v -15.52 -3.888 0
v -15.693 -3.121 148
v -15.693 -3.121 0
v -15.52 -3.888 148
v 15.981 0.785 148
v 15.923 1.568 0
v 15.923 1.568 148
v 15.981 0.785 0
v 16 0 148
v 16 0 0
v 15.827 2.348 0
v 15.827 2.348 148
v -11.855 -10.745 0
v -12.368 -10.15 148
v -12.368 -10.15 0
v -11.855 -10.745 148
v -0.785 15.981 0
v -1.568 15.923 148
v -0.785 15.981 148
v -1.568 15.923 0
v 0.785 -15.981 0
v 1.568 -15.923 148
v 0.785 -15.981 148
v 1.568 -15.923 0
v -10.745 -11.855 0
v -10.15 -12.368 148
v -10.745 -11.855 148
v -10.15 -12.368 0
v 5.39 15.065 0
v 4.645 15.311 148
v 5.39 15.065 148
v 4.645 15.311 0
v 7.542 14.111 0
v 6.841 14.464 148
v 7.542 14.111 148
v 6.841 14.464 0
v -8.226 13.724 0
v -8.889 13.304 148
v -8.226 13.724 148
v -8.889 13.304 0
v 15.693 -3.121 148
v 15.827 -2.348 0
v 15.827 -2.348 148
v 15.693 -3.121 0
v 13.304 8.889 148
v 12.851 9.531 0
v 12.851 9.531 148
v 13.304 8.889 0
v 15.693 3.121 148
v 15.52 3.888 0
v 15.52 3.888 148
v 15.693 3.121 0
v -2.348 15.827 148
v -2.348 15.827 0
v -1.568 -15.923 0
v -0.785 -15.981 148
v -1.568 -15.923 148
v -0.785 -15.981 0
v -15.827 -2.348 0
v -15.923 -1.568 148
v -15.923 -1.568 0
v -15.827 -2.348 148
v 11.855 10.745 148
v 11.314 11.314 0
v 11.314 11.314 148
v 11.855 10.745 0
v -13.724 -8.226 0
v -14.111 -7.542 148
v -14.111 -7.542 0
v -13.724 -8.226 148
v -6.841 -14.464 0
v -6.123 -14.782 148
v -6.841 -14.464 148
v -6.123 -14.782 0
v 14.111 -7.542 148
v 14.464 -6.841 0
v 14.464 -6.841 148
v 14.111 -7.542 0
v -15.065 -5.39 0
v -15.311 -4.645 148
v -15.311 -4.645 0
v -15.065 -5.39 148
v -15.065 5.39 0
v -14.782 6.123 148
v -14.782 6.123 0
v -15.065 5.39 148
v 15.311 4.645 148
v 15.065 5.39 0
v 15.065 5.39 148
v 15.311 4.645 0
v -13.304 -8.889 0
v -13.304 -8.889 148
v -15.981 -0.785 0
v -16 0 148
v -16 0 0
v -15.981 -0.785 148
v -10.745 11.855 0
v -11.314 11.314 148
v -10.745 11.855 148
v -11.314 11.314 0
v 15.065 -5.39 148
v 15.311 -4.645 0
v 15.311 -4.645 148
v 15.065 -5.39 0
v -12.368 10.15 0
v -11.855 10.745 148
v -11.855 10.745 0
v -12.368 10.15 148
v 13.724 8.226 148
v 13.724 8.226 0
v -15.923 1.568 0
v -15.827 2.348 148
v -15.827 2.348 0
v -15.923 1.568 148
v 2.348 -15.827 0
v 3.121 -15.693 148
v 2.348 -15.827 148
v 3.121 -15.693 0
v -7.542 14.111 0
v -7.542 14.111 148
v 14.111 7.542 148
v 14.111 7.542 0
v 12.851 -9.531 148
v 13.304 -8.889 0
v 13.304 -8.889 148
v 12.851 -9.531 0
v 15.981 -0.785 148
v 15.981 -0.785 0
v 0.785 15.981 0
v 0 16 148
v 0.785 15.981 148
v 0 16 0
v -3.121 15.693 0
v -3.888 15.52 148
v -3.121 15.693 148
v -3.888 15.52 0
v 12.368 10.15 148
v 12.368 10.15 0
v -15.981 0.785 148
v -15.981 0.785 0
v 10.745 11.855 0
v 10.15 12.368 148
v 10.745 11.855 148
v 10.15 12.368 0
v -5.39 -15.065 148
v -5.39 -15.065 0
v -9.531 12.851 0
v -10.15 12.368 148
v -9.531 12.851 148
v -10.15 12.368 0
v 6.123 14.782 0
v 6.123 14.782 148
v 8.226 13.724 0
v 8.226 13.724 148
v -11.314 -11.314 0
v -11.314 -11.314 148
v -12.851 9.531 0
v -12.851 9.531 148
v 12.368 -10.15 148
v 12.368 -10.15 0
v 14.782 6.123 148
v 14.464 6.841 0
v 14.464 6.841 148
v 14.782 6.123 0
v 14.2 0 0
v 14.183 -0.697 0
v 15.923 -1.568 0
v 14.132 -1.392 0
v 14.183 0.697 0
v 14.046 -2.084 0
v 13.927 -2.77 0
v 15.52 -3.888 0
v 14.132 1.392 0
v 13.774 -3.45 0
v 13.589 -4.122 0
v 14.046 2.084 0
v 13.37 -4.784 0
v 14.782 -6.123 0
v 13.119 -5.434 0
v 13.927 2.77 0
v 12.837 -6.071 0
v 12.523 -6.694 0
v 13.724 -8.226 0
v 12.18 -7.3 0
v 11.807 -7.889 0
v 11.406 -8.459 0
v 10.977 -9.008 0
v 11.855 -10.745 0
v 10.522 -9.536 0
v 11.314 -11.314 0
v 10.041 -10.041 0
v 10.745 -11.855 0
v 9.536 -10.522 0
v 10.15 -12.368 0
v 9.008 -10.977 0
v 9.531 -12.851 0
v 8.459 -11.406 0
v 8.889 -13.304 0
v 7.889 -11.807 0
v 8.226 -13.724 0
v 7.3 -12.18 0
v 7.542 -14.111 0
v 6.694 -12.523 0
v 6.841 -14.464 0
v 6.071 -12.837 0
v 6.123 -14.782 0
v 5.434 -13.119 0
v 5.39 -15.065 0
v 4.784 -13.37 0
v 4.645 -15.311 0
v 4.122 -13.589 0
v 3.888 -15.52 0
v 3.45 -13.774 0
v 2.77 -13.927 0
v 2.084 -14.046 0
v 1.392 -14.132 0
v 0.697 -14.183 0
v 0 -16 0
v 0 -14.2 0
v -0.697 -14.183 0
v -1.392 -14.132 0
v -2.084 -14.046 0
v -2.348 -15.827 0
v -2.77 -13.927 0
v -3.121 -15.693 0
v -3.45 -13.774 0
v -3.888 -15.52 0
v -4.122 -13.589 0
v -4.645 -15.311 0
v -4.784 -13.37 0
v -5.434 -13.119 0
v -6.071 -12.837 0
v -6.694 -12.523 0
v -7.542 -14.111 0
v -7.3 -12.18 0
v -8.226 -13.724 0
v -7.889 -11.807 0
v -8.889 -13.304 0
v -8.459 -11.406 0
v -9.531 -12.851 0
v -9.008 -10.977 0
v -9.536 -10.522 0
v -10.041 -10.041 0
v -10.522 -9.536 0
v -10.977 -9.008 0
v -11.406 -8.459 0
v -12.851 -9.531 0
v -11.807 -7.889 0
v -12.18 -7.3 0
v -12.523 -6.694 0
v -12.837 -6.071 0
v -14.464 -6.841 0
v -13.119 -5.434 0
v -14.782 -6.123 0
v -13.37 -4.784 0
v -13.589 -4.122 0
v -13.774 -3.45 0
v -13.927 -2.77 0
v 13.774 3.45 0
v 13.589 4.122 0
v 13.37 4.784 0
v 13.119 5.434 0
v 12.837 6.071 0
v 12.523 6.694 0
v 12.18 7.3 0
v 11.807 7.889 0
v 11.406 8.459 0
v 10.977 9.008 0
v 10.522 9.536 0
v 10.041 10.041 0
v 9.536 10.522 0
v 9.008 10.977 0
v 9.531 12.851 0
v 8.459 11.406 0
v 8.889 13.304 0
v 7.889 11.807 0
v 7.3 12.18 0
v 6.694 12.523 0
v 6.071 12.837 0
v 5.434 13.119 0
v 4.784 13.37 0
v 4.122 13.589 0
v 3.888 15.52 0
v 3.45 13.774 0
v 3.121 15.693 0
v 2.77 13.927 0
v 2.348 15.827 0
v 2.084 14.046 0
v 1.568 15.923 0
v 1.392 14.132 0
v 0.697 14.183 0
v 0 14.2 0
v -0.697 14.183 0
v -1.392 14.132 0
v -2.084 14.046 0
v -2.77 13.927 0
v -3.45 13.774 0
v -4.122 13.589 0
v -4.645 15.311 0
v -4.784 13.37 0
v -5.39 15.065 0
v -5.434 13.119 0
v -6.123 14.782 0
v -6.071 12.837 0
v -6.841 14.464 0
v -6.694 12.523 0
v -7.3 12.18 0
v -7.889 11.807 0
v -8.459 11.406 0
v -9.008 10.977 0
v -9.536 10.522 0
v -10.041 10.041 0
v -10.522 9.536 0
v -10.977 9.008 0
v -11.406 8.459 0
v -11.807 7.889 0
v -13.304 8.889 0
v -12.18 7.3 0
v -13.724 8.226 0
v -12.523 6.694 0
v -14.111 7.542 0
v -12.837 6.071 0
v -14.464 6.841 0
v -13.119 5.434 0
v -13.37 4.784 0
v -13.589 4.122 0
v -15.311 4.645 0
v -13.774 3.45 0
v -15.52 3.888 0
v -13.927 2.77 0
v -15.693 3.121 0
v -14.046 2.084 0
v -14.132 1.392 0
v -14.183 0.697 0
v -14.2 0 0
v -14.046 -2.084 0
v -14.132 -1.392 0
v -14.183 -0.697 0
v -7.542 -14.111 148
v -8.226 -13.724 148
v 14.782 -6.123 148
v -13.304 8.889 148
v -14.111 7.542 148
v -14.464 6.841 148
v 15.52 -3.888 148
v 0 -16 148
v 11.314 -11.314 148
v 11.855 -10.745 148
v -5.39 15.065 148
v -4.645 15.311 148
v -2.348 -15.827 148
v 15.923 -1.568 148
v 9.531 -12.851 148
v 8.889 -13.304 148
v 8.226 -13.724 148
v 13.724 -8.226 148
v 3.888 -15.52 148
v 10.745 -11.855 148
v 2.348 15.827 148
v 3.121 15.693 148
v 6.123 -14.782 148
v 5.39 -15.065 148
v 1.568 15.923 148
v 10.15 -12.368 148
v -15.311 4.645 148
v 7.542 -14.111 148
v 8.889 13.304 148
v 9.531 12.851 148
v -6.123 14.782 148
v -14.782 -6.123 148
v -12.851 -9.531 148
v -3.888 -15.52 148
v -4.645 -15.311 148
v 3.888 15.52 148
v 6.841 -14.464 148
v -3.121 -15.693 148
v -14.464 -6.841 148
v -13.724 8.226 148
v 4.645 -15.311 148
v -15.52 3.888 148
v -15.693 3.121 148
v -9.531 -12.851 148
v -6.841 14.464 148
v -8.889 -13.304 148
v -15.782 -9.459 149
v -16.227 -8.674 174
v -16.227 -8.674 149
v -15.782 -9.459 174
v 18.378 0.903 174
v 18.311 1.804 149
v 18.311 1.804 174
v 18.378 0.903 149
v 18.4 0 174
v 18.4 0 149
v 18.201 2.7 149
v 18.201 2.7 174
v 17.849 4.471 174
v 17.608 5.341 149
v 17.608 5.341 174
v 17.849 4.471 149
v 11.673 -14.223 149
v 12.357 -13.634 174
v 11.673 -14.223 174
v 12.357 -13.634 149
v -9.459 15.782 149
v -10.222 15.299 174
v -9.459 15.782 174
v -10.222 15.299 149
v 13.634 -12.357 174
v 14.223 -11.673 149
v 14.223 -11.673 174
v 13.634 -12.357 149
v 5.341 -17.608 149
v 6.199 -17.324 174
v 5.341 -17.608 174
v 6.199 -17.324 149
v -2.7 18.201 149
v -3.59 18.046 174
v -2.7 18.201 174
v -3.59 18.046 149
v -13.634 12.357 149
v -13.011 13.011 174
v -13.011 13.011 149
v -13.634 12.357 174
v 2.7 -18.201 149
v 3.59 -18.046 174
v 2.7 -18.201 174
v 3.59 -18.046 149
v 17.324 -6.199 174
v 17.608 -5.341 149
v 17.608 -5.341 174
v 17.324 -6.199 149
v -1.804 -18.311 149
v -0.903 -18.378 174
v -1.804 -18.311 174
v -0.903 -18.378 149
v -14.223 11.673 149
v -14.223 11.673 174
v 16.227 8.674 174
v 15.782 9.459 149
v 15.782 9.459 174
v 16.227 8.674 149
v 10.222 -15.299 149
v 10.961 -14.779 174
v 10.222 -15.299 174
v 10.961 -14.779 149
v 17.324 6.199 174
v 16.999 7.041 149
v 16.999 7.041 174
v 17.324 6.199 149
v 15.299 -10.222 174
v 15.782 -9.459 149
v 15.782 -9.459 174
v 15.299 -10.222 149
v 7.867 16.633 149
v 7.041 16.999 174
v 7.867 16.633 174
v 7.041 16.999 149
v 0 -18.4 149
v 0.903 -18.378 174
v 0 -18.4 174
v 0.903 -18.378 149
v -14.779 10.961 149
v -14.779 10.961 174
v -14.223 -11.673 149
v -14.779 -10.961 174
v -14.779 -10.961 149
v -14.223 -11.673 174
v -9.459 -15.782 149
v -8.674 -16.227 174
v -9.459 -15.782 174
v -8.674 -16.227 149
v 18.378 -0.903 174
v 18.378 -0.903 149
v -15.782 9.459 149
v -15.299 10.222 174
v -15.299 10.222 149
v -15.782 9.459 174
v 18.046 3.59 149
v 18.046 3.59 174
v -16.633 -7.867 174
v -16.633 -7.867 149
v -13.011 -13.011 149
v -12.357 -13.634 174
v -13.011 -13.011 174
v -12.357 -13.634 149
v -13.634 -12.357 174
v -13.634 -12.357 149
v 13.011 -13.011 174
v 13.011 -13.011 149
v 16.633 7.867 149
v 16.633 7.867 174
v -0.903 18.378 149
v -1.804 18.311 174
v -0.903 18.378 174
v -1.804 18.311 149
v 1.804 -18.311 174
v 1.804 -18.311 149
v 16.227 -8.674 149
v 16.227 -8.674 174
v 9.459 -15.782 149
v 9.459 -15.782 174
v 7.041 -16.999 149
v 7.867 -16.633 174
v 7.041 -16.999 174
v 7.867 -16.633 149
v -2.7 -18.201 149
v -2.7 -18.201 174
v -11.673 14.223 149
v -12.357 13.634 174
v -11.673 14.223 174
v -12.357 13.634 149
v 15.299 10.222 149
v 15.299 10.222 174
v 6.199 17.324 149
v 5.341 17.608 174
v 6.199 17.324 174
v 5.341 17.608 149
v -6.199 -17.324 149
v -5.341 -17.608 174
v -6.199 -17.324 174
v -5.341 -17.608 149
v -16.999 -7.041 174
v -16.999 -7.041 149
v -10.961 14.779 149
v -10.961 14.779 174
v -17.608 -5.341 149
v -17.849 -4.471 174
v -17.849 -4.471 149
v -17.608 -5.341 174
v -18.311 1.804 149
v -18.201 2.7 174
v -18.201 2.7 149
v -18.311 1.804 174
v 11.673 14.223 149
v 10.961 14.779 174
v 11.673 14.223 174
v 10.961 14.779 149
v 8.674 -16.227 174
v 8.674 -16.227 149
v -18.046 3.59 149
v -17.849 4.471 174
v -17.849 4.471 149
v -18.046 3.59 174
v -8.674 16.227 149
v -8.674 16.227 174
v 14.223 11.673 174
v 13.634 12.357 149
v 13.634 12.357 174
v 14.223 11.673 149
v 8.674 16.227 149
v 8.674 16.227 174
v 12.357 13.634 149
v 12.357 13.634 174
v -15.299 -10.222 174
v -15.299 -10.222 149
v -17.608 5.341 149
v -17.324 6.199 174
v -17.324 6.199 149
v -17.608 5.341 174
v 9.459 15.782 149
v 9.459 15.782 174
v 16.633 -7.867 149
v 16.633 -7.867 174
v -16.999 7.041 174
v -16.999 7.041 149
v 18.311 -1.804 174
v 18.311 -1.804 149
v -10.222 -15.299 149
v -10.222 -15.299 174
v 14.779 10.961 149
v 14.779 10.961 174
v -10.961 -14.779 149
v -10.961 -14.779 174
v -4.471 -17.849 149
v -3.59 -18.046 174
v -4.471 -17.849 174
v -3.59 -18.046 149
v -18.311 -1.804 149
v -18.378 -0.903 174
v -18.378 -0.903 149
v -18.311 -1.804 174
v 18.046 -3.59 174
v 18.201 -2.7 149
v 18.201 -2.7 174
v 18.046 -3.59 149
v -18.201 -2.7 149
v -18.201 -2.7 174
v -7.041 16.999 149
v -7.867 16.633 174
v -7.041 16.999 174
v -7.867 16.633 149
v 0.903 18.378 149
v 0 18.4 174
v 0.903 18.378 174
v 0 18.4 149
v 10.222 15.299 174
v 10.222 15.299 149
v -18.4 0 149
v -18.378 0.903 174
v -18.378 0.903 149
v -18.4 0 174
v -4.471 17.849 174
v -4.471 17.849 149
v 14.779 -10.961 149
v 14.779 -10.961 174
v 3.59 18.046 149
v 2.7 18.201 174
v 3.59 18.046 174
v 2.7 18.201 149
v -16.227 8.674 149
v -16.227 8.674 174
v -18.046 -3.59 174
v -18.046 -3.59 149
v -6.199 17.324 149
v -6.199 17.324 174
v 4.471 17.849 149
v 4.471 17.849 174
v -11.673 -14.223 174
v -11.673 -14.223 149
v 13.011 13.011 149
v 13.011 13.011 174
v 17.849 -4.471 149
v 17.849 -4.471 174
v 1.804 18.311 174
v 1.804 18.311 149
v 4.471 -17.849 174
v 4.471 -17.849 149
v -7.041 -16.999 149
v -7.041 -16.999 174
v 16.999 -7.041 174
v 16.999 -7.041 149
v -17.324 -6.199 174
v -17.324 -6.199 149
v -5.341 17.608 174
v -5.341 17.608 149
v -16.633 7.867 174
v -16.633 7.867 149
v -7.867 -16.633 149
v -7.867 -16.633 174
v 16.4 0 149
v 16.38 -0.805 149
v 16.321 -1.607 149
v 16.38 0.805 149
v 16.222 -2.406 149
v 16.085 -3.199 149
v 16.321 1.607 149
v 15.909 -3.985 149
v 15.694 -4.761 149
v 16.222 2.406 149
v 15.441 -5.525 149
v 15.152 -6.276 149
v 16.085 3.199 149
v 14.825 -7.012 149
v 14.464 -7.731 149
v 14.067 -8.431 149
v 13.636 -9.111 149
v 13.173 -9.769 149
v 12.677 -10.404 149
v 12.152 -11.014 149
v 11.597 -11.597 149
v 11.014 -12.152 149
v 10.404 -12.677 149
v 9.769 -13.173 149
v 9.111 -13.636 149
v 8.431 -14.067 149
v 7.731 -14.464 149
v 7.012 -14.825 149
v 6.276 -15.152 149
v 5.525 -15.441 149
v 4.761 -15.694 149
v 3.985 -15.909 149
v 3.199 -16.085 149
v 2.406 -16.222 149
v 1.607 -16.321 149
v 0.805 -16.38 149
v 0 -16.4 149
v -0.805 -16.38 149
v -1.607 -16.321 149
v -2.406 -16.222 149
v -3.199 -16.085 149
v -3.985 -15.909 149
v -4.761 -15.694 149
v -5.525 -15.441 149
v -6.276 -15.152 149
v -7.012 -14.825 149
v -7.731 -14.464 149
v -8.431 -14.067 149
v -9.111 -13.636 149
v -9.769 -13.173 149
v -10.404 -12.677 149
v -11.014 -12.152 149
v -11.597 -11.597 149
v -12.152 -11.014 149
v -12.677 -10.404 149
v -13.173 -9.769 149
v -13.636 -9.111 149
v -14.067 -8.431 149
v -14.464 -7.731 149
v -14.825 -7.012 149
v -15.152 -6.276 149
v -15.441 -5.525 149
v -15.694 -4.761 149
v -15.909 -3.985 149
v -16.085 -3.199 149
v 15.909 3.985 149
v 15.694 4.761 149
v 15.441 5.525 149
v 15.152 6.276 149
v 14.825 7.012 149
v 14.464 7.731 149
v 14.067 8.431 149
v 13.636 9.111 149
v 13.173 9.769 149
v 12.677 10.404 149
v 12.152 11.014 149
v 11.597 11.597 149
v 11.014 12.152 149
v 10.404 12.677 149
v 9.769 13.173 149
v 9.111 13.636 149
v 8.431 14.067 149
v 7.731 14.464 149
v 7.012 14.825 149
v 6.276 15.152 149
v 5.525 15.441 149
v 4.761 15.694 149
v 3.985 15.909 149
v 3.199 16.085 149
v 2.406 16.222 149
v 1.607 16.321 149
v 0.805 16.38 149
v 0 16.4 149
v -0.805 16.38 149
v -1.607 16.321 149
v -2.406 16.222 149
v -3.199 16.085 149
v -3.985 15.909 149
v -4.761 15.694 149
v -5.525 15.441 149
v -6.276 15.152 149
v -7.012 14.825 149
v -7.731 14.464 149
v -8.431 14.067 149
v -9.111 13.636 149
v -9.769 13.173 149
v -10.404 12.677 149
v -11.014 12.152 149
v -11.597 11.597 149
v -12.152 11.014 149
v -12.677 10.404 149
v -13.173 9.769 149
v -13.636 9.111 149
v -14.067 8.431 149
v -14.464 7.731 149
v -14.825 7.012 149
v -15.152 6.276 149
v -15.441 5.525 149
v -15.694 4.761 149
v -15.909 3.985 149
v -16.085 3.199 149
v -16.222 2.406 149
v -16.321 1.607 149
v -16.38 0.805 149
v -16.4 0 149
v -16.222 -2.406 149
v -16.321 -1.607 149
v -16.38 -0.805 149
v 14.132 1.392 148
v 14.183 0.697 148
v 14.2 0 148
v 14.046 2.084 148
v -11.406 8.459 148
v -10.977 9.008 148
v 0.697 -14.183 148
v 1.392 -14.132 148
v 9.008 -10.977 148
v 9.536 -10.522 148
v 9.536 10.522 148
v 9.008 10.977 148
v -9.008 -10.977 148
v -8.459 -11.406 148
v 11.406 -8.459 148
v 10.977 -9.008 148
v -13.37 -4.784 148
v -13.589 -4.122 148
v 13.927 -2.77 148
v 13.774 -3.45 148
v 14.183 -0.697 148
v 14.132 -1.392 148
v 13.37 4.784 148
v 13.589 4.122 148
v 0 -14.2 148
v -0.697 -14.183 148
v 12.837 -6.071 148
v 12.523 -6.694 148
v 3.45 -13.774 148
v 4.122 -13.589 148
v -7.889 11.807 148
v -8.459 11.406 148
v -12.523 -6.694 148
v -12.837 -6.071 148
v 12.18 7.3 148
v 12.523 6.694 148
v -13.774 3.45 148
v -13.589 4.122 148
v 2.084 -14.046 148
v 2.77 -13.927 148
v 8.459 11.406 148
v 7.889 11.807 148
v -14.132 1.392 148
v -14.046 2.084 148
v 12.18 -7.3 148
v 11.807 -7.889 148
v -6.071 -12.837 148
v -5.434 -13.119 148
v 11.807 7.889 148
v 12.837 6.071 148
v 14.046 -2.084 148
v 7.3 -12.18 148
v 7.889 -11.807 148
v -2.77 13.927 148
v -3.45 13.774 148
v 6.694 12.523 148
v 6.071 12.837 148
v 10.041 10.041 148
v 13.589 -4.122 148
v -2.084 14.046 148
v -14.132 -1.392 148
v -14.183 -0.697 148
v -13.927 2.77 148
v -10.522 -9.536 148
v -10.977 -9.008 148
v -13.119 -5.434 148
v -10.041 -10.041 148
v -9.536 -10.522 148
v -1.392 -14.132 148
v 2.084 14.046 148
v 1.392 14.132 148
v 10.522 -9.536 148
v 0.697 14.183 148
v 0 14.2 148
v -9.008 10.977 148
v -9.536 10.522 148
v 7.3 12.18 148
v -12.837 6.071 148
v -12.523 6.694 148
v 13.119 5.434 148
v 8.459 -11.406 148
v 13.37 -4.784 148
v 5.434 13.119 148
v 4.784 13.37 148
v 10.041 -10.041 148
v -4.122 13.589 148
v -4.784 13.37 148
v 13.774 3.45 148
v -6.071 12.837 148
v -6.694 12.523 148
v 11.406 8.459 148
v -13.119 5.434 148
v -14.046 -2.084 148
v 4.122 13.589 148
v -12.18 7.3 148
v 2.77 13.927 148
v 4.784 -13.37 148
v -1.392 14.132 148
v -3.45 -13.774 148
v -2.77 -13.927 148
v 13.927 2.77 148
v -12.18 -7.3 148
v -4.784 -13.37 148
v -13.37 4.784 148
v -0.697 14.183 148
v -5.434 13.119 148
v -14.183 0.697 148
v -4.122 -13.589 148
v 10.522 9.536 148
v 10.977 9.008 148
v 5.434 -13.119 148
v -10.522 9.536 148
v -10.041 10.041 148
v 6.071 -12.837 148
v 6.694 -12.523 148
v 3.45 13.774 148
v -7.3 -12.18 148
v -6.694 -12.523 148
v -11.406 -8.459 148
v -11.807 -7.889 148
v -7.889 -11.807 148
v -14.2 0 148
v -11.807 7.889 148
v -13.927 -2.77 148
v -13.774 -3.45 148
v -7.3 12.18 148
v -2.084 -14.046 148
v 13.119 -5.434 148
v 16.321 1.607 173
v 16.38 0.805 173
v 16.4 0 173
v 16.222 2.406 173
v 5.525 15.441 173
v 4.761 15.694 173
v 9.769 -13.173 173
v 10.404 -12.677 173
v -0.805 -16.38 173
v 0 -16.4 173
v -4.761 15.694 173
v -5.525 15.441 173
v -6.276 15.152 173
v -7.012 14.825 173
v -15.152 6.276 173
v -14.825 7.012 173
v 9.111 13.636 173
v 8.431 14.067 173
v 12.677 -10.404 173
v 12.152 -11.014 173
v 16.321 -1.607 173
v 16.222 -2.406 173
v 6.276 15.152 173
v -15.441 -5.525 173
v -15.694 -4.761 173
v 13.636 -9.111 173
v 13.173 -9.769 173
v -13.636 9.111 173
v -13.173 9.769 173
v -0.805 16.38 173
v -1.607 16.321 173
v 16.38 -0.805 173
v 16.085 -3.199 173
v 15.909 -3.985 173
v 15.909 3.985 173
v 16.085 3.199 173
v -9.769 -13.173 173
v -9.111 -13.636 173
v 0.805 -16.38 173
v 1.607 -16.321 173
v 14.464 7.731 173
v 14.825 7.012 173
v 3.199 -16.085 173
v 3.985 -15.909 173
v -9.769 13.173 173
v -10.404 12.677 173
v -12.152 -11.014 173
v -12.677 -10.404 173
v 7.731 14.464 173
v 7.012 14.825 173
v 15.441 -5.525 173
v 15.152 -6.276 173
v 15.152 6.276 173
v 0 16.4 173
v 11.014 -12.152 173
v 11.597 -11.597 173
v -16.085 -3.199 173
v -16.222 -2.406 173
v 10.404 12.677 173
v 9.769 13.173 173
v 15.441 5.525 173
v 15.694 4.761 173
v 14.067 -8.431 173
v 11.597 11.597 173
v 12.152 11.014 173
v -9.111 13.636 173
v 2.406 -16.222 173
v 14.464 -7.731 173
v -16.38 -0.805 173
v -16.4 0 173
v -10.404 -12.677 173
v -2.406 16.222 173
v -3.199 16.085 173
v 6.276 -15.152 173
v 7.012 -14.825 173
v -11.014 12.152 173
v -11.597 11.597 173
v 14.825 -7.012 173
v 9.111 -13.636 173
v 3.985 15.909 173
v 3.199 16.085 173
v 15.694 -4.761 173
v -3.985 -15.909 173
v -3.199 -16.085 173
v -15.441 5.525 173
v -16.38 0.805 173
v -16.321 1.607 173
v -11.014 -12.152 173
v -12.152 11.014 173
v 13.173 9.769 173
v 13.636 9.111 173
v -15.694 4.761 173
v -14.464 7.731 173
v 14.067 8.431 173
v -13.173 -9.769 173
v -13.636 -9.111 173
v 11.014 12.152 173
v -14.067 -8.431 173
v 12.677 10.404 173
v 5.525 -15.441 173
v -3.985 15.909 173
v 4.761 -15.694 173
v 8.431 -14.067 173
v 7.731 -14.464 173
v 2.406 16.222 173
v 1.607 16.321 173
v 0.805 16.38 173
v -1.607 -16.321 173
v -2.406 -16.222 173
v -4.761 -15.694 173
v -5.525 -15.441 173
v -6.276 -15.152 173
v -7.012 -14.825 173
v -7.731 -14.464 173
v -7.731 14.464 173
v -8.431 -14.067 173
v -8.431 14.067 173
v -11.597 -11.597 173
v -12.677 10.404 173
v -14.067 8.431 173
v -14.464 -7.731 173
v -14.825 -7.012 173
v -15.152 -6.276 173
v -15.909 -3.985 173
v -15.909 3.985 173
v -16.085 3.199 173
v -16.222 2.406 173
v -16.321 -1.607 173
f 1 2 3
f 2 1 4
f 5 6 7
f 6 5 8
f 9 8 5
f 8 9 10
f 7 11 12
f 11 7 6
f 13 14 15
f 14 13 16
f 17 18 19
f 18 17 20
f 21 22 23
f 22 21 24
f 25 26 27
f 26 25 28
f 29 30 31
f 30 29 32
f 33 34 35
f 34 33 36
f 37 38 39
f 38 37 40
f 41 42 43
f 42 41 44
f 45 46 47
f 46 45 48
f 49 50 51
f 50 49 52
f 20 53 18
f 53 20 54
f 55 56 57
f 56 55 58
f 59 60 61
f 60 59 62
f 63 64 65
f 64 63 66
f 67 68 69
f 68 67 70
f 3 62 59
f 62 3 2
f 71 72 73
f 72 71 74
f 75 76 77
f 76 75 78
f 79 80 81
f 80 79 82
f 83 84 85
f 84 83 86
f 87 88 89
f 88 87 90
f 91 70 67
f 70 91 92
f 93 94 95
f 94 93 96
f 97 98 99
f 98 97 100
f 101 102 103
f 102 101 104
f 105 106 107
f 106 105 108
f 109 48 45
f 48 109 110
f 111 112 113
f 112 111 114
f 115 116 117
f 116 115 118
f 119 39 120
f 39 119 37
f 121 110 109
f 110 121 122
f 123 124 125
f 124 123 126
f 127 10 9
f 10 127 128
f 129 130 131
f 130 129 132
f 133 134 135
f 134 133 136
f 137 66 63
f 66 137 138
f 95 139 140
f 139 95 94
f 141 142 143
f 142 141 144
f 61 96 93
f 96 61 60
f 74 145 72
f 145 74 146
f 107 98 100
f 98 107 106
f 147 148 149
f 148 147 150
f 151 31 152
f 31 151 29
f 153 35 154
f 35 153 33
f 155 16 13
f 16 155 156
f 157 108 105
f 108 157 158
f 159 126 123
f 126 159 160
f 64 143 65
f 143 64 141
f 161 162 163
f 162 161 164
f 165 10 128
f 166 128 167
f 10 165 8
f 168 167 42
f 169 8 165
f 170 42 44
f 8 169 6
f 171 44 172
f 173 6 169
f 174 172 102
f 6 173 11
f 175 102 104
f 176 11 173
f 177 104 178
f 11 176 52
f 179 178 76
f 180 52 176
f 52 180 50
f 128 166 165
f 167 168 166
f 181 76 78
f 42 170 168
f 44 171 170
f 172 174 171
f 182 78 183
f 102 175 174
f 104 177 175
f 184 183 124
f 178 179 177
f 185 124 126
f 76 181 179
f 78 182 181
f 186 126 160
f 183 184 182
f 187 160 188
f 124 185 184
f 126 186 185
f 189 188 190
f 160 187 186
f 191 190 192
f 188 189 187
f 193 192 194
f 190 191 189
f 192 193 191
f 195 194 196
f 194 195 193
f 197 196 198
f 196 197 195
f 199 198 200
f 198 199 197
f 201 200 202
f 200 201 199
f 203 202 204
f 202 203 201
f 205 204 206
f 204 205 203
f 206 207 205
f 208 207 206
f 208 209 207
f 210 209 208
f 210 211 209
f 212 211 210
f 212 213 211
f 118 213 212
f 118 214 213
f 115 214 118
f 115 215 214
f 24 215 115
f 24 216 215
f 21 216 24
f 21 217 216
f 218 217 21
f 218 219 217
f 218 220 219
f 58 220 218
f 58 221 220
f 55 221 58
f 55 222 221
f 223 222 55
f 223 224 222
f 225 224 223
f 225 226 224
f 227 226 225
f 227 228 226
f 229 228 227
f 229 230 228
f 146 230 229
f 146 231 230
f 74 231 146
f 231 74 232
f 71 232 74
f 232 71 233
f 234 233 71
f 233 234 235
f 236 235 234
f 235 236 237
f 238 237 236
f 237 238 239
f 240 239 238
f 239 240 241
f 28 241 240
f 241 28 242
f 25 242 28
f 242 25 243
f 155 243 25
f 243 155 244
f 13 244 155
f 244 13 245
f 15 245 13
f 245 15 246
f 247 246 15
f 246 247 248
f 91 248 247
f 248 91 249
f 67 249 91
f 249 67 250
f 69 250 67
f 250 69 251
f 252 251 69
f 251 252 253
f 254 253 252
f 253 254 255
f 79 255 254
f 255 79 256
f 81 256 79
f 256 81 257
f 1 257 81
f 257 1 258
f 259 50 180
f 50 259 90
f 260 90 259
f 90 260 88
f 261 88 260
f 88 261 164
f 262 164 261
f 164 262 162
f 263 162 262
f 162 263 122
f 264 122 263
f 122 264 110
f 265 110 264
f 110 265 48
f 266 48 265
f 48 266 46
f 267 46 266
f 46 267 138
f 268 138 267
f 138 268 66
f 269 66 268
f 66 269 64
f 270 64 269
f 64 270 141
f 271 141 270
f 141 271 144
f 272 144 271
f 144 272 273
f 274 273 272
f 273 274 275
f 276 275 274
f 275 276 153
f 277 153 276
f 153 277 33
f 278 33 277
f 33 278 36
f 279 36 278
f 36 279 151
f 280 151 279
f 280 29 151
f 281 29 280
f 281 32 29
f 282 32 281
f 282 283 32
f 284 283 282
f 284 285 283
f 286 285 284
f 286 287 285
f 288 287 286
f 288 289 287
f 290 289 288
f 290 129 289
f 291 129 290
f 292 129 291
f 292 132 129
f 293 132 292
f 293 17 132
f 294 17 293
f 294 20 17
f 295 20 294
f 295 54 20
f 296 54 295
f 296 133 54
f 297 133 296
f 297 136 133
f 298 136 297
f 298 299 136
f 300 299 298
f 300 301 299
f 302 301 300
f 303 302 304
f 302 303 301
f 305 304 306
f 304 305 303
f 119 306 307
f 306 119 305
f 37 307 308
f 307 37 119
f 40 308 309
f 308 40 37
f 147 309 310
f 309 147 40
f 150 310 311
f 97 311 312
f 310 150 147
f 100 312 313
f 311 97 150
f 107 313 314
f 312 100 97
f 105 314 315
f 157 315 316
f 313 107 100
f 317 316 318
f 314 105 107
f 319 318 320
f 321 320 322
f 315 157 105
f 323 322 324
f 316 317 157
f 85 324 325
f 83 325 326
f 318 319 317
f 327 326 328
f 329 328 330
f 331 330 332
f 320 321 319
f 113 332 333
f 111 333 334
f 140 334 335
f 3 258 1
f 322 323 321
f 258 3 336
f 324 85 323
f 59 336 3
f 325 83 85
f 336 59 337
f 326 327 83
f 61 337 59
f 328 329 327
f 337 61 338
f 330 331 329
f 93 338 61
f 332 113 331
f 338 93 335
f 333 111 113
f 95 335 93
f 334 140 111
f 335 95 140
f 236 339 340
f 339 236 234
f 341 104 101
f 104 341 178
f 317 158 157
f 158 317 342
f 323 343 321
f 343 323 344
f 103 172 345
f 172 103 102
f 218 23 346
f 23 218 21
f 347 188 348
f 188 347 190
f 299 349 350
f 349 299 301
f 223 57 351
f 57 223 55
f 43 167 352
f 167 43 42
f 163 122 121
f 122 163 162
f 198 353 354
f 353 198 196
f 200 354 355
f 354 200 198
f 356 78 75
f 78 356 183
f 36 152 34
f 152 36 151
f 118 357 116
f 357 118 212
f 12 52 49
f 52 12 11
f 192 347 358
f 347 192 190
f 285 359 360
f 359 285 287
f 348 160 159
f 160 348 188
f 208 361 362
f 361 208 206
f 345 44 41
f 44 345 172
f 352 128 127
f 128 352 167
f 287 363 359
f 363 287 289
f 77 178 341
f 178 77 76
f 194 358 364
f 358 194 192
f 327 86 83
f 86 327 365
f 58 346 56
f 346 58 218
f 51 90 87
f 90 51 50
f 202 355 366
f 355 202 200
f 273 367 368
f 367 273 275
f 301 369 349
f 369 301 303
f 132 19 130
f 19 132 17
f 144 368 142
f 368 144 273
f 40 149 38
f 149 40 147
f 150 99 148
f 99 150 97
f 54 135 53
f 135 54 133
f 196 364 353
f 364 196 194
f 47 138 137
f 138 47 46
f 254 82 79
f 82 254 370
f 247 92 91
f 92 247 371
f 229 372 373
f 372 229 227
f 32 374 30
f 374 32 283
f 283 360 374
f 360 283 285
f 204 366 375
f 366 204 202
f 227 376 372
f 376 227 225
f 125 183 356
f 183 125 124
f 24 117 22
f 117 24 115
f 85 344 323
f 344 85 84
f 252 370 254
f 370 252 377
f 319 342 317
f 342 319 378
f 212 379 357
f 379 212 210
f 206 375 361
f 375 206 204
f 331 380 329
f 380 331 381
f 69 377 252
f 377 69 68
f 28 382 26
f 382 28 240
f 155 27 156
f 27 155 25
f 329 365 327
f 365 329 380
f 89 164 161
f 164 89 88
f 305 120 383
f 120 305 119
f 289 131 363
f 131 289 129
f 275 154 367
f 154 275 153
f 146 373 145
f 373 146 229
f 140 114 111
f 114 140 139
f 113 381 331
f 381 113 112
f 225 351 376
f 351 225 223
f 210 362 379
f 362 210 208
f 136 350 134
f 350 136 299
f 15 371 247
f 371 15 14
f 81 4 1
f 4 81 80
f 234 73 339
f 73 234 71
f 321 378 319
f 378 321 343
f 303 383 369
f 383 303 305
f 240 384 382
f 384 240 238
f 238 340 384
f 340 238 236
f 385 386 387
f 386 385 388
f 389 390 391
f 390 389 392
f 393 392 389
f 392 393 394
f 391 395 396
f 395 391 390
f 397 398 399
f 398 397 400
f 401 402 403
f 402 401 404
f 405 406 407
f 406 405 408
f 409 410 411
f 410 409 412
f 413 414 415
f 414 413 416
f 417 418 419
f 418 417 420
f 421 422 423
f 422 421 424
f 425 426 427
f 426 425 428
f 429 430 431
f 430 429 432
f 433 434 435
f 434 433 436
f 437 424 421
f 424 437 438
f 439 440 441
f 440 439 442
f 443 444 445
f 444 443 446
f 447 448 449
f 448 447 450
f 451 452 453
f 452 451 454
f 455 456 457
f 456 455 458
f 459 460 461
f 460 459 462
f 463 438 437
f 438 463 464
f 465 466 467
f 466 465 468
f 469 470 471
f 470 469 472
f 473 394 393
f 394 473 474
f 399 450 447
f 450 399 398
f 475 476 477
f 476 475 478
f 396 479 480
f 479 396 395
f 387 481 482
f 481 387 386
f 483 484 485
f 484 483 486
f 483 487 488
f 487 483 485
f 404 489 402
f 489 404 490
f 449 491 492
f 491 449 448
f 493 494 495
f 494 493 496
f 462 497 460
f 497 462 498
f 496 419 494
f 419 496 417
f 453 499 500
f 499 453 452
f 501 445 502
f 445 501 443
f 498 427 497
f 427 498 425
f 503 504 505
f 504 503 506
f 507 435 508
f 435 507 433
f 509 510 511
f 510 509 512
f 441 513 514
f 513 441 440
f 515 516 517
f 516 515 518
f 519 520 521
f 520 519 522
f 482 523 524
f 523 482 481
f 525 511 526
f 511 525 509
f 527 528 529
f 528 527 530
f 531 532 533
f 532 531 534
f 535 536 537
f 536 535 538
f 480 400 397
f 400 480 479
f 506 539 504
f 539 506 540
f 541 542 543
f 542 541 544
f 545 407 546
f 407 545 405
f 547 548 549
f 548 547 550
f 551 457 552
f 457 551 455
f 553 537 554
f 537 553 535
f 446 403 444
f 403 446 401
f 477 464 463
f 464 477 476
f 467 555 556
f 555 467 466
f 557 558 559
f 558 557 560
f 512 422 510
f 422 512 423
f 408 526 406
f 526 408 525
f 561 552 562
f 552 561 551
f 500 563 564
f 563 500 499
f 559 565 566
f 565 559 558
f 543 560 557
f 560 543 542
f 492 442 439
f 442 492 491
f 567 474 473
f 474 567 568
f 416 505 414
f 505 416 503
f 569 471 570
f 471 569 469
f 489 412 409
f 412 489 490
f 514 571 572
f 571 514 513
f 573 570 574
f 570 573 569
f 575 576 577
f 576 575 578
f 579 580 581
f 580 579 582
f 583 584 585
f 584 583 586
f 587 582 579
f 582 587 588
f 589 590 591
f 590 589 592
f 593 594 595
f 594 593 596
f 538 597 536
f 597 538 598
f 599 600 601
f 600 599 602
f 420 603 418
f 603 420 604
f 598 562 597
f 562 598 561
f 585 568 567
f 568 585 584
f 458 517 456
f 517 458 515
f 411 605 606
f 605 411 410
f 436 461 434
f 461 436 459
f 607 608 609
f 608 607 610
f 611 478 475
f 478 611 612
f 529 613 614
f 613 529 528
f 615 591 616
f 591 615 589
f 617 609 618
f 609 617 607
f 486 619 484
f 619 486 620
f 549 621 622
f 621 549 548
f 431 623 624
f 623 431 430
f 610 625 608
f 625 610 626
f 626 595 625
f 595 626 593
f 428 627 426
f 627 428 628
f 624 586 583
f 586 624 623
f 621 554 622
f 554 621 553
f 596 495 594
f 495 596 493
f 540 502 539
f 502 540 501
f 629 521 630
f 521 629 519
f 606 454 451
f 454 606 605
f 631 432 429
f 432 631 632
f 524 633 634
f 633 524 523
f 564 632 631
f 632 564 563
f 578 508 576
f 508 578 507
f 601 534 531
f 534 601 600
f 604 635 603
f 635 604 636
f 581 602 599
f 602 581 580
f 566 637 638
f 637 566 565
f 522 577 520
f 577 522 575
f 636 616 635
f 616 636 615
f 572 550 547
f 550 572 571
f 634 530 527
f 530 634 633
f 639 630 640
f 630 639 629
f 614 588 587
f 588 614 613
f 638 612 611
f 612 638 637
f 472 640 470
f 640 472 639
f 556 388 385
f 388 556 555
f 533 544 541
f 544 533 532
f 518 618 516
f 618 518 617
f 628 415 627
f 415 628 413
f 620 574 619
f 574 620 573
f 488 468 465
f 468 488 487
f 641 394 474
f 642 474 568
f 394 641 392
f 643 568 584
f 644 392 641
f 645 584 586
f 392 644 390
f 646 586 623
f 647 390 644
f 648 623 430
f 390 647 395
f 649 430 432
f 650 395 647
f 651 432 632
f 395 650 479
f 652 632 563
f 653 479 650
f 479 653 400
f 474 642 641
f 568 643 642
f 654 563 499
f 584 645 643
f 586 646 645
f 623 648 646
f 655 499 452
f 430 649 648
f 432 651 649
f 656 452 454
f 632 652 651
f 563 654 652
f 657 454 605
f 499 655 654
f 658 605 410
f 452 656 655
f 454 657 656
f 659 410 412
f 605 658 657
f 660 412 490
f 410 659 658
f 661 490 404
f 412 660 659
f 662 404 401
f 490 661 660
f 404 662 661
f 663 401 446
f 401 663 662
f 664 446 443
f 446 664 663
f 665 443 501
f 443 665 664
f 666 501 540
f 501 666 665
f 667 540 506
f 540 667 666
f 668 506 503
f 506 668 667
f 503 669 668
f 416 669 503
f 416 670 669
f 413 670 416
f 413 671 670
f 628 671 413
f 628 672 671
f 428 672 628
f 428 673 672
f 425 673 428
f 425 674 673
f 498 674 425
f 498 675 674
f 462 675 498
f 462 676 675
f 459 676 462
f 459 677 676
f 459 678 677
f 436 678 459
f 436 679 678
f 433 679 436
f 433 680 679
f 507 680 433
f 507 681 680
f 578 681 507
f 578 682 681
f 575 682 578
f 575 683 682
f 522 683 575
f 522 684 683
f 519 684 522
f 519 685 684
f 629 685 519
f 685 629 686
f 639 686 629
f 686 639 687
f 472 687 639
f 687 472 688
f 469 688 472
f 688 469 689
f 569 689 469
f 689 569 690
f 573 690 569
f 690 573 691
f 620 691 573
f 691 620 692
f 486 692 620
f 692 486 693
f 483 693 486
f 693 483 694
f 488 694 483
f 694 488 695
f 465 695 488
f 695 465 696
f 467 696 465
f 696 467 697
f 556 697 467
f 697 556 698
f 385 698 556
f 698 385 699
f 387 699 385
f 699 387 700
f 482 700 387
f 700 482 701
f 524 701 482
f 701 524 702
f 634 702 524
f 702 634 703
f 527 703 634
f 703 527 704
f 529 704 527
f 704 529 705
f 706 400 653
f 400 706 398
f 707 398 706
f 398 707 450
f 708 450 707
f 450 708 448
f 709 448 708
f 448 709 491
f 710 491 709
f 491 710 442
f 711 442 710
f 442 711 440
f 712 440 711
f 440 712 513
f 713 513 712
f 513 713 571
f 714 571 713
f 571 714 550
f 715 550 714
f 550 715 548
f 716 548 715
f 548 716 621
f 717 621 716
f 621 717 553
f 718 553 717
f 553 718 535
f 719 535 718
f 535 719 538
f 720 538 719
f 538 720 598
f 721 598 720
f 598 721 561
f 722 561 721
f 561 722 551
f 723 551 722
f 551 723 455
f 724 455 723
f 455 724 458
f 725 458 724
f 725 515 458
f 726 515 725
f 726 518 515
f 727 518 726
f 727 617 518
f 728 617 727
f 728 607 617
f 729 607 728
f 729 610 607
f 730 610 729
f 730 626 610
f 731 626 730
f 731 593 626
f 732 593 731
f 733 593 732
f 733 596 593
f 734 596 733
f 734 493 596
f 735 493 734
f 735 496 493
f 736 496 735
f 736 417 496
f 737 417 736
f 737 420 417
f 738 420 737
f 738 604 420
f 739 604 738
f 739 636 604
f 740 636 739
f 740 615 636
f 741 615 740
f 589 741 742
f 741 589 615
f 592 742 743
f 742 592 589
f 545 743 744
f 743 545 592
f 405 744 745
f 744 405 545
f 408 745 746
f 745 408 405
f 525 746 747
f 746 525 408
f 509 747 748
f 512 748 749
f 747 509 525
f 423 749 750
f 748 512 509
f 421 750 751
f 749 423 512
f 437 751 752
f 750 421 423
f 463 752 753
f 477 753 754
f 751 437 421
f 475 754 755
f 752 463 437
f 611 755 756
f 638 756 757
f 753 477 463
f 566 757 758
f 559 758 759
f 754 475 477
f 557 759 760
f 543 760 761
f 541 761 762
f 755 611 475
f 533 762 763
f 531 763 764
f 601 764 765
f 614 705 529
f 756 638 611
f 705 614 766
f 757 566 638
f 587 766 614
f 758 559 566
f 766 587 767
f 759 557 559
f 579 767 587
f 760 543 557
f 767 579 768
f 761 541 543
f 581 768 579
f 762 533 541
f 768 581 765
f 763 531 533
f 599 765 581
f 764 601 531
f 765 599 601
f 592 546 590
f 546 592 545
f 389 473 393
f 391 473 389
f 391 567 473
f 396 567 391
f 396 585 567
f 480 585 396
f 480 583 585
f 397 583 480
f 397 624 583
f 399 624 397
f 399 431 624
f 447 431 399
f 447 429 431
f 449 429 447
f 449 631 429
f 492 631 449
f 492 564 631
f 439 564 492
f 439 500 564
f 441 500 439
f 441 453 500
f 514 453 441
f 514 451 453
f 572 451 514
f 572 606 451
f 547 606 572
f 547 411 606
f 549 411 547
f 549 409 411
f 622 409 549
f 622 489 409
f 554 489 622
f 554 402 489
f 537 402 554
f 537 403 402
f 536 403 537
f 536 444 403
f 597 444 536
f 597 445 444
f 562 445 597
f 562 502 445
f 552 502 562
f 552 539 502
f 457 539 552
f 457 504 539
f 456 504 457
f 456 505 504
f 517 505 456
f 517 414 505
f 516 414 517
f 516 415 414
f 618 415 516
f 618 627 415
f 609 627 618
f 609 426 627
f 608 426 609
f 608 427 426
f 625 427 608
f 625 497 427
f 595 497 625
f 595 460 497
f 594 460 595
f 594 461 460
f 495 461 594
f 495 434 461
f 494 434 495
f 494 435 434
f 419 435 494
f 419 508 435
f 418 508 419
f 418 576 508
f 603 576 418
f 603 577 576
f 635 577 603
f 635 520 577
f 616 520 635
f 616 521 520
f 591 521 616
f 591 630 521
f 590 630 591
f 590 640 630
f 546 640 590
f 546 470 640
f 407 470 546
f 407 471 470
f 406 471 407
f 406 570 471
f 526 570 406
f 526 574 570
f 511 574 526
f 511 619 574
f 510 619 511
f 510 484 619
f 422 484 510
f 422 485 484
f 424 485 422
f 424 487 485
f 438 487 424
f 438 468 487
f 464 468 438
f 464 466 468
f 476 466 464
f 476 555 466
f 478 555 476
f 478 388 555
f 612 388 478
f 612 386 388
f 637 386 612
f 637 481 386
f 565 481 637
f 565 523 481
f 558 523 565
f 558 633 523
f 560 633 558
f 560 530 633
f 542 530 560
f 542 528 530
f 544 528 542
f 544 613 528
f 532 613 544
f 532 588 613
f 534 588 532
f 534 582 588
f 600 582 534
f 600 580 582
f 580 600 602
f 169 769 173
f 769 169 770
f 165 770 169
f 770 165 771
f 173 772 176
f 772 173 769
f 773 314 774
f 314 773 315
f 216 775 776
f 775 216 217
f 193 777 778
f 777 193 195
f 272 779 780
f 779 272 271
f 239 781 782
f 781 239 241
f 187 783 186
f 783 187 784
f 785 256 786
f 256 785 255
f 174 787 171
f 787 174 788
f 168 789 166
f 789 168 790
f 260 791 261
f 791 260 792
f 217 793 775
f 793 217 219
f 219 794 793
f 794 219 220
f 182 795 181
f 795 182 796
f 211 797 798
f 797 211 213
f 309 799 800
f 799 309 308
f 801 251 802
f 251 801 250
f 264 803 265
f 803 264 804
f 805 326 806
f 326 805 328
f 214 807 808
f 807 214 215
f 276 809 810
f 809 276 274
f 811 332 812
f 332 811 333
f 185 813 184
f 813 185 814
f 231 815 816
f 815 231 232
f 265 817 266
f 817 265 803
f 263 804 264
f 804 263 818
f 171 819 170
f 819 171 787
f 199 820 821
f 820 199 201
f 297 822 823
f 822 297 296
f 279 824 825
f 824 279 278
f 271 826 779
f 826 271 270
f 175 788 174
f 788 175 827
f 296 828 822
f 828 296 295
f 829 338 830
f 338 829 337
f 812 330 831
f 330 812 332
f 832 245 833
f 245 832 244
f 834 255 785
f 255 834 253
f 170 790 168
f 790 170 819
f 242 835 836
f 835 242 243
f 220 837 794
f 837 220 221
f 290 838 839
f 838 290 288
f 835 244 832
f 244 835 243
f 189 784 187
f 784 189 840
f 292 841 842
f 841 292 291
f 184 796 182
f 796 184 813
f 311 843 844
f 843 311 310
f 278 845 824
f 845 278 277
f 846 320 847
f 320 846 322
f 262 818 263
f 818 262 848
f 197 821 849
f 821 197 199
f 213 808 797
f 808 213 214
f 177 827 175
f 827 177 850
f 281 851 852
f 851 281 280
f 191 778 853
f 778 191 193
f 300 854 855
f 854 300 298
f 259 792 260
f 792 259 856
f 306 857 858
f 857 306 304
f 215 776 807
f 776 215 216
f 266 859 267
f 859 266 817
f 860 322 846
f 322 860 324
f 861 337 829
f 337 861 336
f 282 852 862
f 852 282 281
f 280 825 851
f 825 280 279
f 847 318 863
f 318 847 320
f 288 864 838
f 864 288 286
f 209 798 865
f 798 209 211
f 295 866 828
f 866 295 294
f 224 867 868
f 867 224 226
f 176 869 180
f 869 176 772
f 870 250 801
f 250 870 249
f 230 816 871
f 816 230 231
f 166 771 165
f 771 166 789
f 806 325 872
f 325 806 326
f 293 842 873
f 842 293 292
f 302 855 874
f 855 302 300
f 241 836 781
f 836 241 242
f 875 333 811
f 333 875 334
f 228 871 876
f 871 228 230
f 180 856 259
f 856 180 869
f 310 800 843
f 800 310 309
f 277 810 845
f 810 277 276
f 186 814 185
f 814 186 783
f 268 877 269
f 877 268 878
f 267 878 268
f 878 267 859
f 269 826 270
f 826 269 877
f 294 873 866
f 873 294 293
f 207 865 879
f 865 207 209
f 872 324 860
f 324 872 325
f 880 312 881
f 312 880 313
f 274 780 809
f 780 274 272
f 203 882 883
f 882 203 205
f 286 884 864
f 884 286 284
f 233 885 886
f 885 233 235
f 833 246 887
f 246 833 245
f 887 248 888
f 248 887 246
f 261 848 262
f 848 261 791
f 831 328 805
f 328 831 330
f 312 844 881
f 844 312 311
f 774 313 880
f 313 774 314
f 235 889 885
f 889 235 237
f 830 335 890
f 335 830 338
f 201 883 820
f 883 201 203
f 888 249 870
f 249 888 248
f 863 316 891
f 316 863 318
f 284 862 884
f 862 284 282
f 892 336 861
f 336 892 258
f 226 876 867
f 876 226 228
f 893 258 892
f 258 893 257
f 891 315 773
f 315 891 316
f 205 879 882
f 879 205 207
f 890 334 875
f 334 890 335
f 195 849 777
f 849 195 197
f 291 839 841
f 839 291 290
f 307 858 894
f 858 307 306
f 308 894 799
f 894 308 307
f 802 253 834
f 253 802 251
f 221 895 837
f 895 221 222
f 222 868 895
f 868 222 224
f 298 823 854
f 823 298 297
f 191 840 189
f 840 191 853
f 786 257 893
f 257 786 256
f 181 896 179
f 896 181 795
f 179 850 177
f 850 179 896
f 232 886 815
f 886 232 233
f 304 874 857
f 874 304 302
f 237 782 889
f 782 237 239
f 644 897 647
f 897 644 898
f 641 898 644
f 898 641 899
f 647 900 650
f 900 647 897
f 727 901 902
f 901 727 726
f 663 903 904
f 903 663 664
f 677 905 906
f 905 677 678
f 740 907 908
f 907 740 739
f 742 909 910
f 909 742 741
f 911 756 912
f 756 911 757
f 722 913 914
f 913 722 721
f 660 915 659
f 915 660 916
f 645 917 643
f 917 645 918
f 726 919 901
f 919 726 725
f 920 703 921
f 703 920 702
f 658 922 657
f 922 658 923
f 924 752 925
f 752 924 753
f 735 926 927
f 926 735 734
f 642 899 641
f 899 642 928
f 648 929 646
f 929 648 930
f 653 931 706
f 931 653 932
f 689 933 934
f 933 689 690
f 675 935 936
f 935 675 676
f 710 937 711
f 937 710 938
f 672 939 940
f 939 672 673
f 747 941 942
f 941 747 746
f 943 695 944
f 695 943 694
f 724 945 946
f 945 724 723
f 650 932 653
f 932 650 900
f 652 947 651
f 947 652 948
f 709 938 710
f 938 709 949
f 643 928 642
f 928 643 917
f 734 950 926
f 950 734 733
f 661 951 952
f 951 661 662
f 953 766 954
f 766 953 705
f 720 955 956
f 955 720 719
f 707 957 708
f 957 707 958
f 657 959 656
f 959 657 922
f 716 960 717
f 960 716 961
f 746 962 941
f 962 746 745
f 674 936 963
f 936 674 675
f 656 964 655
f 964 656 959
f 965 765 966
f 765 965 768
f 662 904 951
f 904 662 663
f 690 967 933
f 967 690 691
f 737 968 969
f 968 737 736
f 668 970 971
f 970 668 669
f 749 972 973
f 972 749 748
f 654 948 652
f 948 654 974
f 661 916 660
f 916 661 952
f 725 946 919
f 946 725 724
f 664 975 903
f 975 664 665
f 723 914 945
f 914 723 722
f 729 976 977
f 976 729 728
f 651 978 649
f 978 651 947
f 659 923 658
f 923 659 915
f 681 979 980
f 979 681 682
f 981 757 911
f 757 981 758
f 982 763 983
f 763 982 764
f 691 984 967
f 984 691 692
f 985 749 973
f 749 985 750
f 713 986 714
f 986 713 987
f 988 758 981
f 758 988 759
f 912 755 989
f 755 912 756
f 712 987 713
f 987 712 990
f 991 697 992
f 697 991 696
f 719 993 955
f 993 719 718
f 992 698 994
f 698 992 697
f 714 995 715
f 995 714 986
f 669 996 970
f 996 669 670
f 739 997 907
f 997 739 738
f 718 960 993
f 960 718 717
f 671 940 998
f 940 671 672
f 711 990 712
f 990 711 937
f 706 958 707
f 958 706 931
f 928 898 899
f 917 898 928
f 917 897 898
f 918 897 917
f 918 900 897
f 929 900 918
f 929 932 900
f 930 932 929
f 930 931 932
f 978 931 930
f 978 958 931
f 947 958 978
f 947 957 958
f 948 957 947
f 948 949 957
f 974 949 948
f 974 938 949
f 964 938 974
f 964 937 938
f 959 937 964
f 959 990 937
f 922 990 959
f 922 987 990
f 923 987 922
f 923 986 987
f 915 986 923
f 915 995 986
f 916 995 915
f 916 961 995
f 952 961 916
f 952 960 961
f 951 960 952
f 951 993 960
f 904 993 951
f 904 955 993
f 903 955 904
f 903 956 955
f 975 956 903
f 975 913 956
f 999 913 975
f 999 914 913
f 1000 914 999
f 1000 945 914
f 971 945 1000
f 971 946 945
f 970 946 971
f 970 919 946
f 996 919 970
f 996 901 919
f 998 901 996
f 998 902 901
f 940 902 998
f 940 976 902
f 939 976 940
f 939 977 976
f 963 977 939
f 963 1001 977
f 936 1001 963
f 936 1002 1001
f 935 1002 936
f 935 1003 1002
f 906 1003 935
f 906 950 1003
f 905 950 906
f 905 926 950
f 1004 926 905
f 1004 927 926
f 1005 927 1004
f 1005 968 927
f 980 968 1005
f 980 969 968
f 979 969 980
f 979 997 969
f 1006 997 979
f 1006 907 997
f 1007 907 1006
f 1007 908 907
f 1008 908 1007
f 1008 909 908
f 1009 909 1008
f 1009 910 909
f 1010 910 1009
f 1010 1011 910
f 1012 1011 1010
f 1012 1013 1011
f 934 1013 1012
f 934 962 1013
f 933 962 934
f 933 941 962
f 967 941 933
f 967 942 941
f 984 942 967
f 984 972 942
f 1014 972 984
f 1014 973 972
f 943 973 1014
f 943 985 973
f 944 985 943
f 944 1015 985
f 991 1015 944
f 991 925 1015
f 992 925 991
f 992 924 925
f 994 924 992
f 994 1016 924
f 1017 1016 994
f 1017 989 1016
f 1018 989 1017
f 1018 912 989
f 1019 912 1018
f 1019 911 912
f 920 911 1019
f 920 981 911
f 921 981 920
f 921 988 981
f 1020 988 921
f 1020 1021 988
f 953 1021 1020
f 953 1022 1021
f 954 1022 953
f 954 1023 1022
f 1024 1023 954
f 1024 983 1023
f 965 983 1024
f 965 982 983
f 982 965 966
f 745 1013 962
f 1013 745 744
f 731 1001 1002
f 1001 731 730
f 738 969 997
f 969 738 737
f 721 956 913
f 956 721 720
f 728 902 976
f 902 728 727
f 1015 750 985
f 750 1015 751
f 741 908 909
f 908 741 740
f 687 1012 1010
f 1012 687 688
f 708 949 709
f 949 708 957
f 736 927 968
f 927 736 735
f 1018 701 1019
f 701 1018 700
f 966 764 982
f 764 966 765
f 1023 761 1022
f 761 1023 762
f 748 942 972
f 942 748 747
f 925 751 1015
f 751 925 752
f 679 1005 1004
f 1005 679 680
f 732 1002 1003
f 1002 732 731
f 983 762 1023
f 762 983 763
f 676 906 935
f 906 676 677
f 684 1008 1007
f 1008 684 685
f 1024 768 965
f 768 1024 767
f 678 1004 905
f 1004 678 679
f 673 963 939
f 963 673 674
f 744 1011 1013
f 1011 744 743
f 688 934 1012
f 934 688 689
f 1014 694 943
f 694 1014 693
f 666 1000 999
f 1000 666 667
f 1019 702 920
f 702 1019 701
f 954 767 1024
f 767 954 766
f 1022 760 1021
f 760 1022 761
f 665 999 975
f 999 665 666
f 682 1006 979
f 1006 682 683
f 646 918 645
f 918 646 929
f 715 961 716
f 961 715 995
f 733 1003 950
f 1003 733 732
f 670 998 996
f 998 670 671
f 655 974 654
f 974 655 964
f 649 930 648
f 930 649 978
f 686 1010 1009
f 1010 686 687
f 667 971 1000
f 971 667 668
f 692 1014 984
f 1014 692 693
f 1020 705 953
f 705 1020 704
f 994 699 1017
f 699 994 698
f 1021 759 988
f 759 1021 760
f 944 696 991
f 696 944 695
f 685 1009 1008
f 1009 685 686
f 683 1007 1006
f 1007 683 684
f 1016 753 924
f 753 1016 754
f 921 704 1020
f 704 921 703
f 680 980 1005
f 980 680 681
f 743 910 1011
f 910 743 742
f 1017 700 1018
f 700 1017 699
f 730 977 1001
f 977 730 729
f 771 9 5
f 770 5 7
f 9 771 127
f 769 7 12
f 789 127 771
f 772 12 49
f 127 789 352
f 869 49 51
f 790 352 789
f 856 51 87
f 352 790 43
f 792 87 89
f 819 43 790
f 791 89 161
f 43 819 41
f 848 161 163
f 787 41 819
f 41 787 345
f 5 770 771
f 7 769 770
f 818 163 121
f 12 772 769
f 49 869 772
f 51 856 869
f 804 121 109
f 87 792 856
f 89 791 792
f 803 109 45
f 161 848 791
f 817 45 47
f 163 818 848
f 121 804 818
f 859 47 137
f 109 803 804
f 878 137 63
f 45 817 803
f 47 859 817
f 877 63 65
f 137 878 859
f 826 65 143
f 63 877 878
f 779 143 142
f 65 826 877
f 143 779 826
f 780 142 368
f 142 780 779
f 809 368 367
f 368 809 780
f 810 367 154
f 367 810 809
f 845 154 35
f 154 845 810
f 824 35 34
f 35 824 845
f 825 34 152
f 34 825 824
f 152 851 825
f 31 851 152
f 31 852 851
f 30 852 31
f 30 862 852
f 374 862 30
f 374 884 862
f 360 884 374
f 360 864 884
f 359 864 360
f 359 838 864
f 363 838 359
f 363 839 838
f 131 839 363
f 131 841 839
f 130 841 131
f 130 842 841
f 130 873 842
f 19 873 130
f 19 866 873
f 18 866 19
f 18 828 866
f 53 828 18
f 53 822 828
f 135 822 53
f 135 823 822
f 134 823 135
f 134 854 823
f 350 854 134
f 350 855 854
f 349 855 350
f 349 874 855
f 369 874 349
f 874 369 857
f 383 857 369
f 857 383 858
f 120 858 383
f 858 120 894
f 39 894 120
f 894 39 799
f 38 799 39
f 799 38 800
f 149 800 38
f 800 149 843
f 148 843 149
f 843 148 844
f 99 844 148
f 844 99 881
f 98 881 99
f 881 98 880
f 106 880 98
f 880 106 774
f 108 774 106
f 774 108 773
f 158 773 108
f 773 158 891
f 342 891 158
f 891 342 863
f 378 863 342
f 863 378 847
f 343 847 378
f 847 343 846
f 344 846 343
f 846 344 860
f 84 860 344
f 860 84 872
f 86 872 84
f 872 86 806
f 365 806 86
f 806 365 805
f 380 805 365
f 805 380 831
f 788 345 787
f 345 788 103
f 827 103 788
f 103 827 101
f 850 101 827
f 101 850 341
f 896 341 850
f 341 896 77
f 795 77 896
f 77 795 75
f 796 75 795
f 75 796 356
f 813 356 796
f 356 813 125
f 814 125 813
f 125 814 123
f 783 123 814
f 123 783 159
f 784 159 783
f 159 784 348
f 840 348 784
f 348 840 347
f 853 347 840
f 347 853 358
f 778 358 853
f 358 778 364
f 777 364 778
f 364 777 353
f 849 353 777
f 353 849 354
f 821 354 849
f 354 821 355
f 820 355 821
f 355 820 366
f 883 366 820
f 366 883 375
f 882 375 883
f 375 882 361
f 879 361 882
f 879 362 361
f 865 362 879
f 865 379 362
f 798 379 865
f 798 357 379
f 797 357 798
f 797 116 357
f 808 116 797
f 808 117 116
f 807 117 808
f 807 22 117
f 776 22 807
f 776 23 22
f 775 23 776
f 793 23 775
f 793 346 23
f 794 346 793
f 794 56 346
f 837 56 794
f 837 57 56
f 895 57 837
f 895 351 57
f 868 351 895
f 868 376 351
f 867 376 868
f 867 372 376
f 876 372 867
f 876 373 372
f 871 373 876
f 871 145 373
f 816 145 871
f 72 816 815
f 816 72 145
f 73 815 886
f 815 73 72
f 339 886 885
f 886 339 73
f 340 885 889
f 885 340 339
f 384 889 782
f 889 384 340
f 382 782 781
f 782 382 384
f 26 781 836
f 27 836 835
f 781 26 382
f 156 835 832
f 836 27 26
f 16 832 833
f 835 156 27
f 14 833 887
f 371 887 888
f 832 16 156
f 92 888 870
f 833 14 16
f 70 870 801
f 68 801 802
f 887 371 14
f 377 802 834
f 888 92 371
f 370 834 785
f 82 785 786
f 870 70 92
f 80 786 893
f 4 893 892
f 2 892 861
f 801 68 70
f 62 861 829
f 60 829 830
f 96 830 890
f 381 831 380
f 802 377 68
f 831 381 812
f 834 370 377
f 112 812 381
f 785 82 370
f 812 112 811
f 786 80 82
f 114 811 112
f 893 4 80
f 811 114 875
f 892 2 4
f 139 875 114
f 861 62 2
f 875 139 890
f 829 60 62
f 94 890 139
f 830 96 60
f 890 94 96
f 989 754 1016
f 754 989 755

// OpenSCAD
// Parameters
length_mm = 150; //[75:300:1]
ht32_od = 32; //[16:64:0.5]
wall_thickness = 1.8; //[0.9:3.6:0.1]
socket_length = 25; //[12.5:50:0.5]
socket_wall = 2.4; //[1.2:4.8:0.1]
socket_clearance = 0.4; //[0.1:1.0:0.05]
socket_stop_thickness = 2.0; //[1.0:4.0:0.1]
overlap = 1.0; //[0.5:2.0:0.1]

$fn = 128;

// Module for the HT Pipe (one connected solid)
module ht_pipe() {
  od_r = ht32_od/2;
  id_r = max(0.01, od_r - wall_thickness);

  sock_od_r = od_r + socket_wall;
  sock_id_r = max(0.01, od_r + socket_clearance);

  // Socket is at the pipe end, overlapping into the pipe to guarantee connectivity
  sock_h  = socket_length;
  sock_z0 = length_mm - overlap;

  // Inner socket bore: starts at socket mouth and stops short to form a stop ring
  bore_h = max(0.01, socket_length - socket_stop_thickness);

  color([0.85, 0.85, 0.8])
  difference() {
    // OUTER solid (pipe + socket) as one connected union
    union() {
      cylinder(h=length_mm, r=od_r, center=false);
      translate([0, 0, sock_z0])
        cylinder(h=sock_h, r=sock_od_r, center=false);
    }

    // INNER voids removed in one pass to avoid coplanar/empty artifacts
    union() {
      // Main pipe bore (through entire pipe)
      translate([0, 0, -overlap])
        cylinder(h=length_mm + 2*overlap, r=id_r, center=false);

      // Socket bore (from socket mouth down to stop ring)
      translate([0, 0, sock_z0 - overlap])
        cylinder(h=bore_h + 2*overlap, r=sock_id_r, center=false);
    }
  }
}

// Assembly
module assembly() {
  ht_pipe();
}

assembly();
